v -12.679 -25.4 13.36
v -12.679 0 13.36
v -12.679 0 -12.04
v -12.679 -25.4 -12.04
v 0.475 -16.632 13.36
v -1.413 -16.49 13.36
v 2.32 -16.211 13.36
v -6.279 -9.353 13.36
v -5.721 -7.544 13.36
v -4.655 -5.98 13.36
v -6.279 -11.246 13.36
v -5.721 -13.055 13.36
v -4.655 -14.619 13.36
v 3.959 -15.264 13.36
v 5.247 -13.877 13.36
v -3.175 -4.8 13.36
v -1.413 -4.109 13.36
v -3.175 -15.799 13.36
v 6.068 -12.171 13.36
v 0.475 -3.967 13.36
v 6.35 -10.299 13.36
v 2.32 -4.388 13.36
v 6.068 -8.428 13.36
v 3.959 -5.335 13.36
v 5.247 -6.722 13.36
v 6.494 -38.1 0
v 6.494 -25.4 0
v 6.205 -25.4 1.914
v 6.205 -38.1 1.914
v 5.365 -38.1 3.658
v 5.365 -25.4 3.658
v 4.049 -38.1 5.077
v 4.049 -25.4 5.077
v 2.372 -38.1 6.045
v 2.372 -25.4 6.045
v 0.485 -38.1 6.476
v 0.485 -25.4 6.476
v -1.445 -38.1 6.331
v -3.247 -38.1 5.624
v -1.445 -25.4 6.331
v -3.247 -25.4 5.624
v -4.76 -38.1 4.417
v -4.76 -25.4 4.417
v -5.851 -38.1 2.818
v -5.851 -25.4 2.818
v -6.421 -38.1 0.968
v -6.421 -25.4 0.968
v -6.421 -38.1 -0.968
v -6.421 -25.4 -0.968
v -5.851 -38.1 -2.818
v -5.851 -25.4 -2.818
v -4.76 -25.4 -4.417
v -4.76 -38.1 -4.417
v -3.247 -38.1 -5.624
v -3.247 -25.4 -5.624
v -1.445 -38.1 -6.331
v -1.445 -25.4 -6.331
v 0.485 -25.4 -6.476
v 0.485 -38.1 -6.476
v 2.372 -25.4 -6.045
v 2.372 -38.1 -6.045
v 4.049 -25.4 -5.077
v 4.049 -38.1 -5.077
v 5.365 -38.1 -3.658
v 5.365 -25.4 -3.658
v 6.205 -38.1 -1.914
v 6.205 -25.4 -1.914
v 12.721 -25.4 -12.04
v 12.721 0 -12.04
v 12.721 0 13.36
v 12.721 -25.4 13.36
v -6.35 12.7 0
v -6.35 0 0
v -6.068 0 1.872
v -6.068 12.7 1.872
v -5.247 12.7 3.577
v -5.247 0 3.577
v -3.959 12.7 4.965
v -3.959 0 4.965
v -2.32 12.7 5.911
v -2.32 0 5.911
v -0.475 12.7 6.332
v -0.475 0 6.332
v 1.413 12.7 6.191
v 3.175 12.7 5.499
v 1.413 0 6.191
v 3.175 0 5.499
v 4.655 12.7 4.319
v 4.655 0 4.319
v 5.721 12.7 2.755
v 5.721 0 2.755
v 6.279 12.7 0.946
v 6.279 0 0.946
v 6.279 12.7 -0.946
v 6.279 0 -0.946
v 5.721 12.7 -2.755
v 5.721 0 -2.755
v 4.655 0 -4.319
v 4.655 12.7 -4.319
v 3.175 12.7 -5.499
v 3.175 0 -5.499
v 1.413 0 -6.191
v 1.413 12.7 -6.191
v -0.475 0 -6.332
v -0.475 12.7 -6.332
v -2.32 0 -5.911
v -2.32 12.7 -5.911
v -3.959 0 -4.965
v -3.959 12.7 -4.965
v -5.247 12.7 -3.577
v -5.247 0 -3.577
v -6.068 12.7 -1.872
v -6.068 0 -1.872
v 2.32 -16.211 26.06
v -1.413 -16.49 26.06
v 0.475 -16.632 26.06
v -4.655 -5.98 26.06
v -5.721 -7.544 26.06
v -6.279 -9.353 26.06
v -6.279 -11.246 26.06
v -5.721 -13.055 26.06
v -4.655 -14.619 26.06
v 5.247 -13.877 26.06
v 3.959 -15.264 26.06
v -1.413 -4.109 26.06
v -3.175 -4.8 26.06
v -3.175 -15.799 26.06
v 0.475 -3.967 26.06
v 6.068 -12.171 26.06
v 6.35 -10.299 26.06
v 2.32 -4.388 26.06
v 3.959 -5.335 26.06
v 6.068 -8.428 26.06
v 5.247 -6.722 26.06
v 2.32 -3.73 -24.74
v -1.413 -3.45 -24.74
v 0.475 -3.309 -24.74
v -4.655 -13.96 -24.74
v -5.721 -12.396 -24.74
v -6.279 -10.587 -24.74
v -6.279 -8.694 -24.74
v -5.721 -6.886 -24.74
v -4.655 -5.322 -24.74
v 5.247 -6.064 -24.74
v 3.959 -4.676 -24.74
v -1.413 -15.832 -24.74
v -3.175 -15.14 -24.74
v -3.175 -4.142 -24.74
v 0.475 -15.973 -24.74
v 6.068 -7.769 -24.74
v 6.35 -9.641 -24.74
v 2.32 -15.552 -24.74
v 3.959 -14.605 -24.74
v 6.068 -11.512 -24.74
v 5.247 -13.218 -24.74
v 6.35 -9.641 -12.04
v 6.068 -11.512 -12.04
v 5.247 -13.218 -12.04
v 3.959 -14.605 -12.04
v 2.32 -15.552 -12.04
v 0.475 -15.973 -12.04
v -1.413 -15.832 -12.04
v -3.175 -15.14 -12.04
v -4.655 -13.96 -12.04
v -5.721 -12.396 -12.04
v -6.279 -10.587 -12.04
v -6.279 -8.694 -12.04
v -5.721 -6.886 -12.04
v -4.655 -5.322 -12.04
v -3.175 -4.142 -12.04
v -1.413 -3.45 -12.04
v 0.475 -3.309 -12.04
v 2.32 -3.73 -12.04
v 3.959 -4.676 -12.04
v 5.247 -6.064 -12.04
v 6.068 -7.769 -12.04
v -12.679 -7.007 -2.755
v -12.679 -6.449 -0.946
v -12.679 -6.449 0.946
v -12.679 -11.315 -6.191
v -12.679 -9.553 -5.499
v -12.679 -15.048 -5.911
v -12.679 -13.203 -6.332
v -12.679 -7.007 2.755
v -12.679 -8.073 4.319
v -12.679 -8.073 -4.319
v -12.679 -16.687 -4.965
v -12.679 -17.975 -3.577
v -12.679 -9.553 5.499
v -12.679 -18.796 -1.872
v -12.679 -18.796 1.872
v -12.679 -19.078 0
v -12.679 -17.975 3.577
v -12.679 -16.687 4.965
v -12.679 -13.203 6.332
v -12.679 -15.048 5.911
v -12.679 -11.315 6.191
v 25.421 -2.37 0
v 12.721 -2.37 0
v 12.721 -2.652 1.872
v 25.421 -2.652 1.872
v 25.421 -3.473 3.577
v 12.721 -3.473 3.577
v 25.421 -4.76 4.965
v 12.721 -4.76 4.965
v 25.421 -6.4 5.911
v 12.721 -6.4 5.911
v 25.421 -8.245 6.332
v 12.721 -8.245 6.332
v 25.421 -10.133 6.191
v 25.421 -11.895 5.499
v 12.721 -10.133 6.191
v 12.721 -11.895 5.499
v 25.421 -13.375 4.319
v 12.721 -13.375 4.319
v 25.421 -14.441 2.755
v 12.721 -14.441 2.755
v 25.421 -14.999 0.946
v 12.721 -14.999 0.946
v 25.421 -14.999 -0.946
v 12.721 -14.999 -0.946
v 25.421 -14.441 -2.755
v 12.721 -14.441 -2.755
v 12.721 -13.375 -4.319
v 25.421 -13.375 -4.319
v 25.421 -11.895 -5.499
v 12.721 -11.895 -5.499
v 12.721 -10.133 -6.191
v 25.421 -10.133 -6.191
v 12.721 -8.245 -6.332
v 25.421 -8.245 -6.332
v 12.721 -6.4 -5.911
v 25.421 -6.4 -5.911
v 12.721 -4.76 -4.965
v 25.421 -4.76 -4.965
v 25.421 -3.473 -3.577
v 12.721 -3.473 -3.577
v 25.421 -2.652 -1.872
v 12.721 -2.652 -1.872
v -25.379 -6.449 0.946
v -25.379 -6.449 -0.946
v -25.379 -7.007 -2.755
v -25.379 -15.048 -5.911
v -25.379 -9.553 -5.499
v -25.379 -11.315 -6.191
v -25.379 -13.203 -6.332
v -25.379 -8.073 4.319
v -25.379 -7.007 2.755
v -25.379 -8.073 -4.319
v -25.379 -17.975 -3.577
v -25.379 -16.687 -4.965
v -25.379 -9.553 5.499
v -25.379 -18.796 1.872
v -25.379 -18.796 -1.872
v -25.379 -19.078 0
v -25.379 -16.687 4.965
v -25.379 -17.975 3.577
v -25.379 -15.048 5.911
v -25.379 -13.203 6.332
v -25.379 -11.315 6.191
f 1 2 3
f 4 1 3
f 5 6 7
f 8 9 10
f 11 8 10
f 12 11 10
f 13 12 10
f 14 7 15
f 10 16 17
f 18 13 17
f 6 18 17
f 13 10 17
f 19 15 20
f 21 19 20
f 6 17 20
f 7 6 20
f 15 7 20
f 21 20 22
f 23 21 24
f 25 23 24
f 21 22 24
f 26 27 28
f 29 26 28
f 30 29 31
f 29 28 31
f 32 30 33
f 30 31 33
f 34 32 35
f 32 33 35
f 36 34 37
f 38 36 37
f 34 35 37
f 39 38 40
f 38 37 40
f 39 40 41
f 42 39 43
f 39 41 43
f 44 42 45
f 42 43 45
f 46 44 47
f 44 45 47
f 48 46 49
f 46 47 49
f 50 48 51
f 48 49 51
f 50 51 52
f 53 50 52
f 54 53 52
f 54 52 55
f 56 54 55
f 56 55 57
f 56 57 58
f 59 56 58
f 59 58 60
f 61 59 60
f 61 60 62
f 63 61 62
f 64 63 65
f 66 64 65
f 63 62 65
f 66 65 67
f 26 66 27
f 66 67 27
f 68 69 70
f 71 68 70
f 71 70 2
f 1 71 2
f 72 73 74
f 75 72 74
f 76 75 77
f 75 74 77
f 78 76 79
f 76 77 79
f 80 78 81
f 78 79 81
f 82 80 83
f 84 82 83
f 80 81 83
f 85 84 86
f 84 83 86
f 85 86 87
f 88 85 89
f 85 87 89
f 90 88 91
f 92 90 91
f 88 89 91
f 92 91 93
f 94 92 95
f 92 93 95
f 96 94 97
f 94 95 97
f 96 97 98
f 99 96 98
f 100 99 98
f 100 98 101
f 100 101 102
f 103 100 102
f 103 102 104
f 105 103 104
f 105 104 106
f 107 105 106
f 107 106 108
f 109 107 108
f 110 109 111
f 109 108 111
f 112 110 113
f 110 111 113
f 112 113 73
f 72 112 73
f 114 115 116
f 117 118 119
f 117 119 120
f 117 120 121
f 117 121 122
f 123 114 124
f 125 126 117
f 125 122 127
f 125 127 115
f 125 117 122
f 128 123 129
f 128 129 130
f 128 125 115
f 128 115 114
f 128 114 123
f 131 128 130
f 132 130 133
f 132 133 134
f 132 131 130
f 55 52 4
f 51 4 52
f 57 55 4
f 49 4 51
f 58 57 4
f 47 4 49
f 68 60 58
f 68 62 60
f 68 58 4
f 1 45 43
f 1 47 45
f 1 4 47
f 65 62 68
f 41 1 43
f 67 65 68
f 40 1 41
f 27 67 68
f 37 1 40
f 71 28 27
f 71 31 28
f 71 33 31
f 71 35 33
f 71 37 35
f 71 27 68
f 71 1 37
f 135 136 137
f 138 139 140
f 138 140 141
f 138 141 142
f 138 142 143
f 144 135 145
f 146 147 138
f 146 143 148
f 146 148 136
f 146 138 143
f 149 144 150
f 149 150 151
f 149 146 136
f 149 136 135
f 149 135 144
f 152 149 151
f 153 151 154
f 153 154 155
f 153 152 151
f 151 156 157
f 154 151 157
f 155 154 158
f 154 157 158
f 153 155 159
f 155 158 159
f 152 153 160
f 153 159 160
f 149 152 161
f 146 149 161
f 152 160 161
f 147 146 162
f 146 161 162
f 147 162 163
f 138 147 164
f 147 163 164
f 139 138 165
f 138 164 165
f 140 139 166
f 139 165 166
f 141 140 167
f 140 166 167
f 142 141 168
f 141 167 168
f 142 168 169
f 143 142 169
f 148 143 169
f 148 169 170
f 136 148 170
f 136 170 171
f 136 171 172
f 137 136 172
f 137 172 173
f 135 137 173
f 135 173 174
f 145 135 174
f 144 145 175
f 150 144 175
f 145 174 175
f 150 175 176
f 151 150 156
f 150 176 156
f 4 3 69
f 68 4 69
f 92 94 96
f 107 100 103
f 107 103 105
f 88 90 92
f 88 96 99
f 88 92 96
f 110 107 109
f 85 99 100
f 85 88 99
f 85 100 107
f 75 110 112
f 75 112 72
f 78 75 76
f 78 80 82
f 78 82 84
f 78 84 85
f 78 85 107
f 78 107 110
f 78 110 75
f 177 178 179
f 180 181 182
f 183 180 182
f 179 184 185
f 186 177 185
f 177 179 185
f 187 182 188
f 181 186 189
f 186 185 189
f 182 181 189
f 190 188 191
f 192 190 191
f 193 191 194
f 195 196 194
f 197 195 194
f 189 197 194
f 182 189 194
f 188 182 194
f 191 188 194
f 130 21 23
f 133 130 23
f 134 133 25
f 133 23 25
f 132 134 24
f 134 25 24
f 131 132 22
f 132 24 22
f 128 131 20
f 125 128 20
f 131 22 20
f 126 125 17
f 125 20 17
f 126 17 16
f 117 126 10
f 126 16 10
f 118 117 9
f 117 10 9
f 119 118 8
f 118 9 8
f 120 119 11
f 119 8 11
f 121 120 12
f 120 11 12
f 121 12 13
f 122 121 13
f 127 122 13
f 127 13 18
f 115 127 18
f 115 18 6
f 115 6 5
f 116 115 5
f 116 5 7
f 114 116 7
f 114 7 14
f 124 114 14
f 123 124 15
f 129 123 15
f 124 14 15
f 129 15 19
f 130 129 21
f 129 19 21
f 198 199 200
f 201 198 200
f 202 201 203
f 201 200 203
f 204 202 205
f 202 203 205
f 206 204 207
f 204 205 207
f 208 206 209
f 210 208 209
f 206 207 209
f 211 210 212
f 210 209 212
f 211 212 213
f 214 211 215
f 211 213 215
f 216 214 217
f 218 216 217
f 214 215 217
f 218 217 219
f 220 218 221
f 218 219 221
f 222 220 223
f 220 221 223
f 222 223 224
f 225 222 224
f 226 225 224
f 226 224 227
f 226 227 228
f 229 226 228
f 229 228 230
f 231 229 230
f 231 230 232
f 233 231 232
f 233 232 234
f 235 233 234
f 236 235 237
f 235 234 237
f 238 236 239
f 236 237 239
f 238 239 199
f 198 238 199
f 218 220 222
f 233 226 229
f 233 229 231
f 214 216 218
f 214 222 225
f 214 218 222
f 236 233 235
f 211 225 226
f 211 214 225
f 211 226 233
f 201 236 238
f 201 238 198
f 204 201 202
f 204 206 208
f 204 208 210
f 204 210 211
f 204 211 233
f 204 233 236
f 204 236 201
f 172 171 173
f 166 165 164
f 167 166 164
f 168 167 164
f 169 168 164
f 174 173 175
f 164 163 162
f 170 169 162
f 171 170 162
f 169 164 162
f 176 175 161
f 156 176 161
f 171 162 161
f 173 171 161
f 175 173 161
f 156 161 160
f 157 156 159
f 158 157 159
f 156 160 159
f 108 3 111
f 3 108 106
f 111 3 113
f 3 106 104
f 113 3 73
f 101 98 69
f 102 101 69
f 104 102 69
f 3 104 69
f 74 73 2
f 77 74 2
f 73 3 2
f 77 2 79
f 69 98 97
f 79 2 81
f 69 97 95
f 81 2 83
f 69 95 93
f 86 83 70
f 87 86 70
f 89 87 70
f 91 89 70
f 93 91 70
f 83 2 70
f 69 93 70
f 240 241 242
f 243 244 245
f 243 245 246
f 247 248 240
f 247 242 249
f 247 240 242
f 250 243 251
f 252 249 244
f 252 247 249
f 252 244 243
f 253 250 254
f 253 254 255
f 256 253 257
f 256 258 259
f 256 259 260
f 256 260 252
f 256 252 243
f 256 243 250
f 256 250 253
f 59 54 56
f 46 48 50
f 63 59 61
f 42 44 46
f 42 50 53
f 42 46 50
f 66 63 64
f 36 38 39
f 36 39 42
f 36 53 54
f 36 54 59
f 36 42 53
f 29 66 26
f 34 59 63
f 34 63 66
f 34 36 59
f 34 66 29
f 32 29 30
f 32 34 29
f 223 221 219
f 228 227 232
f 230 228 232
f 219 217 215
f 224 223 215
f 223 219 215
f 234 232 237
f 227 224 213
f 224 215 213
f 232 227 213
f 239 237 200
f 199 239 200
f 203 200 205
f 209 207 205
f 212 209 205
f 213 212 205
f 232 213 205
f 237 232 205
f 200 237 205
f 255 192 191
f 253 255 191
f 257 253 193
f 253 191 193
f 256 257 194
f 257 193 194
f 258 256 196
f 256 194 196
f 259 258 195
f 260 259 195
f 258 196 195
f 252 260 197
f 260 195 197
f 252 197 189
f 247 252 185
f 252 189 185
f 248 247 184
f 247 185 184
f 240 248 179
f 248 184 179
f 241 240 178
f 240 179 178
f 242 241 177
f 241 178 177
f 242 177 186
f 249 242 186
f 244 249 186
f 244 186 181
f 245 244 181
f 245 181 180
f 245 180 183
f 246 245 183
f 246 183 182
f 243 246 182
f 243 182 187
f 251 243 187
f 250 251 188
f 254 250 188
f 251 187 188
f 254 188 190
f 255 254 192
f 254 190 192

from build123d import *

# Parameters (mm, degrees)
F1_DEPTH  = 25.4
F3_R      = 6.35
F4_DEPTH  = 12.7
F2_R      = 6.493715
F5_DEPTH  = 12.7
F6_R      = 6.35
F7_DEPTH  = 12.7
F8_R      = 6.35
F9_DEPTH  = 12.7
F10_R     = 6.35
F11_DEPTH = 12.7
F12_R     = 6.35
F13_DEPTH = 12.7


with BuildPart() as f1:
    # F0 (on Front) → F1 (new body)
    with BuildSketch(Plane.XZ):
        Polygon((12.721216, 13.360342), (-12.678784, 13.360342), (-12.678784, 11.51153), (-12.678784, -12.039658), (12.721216, -12.039658), align=None)
    extrude(amount=F1_DEPTH)

    # F3 (on face) → F4 (join)
    with BuildSketch(Plane(origin=(0, 0, 0), x_dir=(-1, 0, 0), z_dir=(0, 1, 0))):
        Circle(F3_R)
    extrude(amount=F4_DEPTH)

    # F2 (on face) → F5 (join)
    with BuildSketch(Plane.XZ.offset(25.4)):
        Circle(F2_R)
    extrude(amount=F5_DEPTH)


with BuildPart() as f7:
    # F6 (on face) → F7 (new body)
    with BuildSketch(Plane.XY.offset(13.360342)):
        with Locations((0, -10.299483)):
            Circle(F6_R)
    extrude(amount=F7_DEPTH)


with BuildPart() as f9:
    # F8 (on face) → F9 (new body)
    with BuildSketch(Plane(origin=(-12.678784, 0, 0), x_dir=(0, -1, 0), z_dir=(-1, 0, 0))):
        with Locations((12.728129, 0)):
            Circle(F8_R)
    extrude(amount=F9_DEPTH)


with BuildPart() as f11:
    # F10 (on face) → F11 (new body)
    with BuildSketch(Plane(origin=(0, 0, -12.039658), x_dir=(1, 0, 0), z_dir=(0, 0, -1))):
        with Locations((0, 9.640794)):
            Circle(F10_R)
    extrude(amount=F11_DEPTH)


with BuildPart() as f13:
    # F12 (on face) → F13 (new body)
    with BuildSketch(Plane.YZ.offset(12.721216)):
        with Locations((-8.71964, 0)):
            Circle(F12_R)
    extrude(amount=F13_DEPTH)


solid = Compound([f1.part, f7.part, f9.part, f11.part, f13.part])
